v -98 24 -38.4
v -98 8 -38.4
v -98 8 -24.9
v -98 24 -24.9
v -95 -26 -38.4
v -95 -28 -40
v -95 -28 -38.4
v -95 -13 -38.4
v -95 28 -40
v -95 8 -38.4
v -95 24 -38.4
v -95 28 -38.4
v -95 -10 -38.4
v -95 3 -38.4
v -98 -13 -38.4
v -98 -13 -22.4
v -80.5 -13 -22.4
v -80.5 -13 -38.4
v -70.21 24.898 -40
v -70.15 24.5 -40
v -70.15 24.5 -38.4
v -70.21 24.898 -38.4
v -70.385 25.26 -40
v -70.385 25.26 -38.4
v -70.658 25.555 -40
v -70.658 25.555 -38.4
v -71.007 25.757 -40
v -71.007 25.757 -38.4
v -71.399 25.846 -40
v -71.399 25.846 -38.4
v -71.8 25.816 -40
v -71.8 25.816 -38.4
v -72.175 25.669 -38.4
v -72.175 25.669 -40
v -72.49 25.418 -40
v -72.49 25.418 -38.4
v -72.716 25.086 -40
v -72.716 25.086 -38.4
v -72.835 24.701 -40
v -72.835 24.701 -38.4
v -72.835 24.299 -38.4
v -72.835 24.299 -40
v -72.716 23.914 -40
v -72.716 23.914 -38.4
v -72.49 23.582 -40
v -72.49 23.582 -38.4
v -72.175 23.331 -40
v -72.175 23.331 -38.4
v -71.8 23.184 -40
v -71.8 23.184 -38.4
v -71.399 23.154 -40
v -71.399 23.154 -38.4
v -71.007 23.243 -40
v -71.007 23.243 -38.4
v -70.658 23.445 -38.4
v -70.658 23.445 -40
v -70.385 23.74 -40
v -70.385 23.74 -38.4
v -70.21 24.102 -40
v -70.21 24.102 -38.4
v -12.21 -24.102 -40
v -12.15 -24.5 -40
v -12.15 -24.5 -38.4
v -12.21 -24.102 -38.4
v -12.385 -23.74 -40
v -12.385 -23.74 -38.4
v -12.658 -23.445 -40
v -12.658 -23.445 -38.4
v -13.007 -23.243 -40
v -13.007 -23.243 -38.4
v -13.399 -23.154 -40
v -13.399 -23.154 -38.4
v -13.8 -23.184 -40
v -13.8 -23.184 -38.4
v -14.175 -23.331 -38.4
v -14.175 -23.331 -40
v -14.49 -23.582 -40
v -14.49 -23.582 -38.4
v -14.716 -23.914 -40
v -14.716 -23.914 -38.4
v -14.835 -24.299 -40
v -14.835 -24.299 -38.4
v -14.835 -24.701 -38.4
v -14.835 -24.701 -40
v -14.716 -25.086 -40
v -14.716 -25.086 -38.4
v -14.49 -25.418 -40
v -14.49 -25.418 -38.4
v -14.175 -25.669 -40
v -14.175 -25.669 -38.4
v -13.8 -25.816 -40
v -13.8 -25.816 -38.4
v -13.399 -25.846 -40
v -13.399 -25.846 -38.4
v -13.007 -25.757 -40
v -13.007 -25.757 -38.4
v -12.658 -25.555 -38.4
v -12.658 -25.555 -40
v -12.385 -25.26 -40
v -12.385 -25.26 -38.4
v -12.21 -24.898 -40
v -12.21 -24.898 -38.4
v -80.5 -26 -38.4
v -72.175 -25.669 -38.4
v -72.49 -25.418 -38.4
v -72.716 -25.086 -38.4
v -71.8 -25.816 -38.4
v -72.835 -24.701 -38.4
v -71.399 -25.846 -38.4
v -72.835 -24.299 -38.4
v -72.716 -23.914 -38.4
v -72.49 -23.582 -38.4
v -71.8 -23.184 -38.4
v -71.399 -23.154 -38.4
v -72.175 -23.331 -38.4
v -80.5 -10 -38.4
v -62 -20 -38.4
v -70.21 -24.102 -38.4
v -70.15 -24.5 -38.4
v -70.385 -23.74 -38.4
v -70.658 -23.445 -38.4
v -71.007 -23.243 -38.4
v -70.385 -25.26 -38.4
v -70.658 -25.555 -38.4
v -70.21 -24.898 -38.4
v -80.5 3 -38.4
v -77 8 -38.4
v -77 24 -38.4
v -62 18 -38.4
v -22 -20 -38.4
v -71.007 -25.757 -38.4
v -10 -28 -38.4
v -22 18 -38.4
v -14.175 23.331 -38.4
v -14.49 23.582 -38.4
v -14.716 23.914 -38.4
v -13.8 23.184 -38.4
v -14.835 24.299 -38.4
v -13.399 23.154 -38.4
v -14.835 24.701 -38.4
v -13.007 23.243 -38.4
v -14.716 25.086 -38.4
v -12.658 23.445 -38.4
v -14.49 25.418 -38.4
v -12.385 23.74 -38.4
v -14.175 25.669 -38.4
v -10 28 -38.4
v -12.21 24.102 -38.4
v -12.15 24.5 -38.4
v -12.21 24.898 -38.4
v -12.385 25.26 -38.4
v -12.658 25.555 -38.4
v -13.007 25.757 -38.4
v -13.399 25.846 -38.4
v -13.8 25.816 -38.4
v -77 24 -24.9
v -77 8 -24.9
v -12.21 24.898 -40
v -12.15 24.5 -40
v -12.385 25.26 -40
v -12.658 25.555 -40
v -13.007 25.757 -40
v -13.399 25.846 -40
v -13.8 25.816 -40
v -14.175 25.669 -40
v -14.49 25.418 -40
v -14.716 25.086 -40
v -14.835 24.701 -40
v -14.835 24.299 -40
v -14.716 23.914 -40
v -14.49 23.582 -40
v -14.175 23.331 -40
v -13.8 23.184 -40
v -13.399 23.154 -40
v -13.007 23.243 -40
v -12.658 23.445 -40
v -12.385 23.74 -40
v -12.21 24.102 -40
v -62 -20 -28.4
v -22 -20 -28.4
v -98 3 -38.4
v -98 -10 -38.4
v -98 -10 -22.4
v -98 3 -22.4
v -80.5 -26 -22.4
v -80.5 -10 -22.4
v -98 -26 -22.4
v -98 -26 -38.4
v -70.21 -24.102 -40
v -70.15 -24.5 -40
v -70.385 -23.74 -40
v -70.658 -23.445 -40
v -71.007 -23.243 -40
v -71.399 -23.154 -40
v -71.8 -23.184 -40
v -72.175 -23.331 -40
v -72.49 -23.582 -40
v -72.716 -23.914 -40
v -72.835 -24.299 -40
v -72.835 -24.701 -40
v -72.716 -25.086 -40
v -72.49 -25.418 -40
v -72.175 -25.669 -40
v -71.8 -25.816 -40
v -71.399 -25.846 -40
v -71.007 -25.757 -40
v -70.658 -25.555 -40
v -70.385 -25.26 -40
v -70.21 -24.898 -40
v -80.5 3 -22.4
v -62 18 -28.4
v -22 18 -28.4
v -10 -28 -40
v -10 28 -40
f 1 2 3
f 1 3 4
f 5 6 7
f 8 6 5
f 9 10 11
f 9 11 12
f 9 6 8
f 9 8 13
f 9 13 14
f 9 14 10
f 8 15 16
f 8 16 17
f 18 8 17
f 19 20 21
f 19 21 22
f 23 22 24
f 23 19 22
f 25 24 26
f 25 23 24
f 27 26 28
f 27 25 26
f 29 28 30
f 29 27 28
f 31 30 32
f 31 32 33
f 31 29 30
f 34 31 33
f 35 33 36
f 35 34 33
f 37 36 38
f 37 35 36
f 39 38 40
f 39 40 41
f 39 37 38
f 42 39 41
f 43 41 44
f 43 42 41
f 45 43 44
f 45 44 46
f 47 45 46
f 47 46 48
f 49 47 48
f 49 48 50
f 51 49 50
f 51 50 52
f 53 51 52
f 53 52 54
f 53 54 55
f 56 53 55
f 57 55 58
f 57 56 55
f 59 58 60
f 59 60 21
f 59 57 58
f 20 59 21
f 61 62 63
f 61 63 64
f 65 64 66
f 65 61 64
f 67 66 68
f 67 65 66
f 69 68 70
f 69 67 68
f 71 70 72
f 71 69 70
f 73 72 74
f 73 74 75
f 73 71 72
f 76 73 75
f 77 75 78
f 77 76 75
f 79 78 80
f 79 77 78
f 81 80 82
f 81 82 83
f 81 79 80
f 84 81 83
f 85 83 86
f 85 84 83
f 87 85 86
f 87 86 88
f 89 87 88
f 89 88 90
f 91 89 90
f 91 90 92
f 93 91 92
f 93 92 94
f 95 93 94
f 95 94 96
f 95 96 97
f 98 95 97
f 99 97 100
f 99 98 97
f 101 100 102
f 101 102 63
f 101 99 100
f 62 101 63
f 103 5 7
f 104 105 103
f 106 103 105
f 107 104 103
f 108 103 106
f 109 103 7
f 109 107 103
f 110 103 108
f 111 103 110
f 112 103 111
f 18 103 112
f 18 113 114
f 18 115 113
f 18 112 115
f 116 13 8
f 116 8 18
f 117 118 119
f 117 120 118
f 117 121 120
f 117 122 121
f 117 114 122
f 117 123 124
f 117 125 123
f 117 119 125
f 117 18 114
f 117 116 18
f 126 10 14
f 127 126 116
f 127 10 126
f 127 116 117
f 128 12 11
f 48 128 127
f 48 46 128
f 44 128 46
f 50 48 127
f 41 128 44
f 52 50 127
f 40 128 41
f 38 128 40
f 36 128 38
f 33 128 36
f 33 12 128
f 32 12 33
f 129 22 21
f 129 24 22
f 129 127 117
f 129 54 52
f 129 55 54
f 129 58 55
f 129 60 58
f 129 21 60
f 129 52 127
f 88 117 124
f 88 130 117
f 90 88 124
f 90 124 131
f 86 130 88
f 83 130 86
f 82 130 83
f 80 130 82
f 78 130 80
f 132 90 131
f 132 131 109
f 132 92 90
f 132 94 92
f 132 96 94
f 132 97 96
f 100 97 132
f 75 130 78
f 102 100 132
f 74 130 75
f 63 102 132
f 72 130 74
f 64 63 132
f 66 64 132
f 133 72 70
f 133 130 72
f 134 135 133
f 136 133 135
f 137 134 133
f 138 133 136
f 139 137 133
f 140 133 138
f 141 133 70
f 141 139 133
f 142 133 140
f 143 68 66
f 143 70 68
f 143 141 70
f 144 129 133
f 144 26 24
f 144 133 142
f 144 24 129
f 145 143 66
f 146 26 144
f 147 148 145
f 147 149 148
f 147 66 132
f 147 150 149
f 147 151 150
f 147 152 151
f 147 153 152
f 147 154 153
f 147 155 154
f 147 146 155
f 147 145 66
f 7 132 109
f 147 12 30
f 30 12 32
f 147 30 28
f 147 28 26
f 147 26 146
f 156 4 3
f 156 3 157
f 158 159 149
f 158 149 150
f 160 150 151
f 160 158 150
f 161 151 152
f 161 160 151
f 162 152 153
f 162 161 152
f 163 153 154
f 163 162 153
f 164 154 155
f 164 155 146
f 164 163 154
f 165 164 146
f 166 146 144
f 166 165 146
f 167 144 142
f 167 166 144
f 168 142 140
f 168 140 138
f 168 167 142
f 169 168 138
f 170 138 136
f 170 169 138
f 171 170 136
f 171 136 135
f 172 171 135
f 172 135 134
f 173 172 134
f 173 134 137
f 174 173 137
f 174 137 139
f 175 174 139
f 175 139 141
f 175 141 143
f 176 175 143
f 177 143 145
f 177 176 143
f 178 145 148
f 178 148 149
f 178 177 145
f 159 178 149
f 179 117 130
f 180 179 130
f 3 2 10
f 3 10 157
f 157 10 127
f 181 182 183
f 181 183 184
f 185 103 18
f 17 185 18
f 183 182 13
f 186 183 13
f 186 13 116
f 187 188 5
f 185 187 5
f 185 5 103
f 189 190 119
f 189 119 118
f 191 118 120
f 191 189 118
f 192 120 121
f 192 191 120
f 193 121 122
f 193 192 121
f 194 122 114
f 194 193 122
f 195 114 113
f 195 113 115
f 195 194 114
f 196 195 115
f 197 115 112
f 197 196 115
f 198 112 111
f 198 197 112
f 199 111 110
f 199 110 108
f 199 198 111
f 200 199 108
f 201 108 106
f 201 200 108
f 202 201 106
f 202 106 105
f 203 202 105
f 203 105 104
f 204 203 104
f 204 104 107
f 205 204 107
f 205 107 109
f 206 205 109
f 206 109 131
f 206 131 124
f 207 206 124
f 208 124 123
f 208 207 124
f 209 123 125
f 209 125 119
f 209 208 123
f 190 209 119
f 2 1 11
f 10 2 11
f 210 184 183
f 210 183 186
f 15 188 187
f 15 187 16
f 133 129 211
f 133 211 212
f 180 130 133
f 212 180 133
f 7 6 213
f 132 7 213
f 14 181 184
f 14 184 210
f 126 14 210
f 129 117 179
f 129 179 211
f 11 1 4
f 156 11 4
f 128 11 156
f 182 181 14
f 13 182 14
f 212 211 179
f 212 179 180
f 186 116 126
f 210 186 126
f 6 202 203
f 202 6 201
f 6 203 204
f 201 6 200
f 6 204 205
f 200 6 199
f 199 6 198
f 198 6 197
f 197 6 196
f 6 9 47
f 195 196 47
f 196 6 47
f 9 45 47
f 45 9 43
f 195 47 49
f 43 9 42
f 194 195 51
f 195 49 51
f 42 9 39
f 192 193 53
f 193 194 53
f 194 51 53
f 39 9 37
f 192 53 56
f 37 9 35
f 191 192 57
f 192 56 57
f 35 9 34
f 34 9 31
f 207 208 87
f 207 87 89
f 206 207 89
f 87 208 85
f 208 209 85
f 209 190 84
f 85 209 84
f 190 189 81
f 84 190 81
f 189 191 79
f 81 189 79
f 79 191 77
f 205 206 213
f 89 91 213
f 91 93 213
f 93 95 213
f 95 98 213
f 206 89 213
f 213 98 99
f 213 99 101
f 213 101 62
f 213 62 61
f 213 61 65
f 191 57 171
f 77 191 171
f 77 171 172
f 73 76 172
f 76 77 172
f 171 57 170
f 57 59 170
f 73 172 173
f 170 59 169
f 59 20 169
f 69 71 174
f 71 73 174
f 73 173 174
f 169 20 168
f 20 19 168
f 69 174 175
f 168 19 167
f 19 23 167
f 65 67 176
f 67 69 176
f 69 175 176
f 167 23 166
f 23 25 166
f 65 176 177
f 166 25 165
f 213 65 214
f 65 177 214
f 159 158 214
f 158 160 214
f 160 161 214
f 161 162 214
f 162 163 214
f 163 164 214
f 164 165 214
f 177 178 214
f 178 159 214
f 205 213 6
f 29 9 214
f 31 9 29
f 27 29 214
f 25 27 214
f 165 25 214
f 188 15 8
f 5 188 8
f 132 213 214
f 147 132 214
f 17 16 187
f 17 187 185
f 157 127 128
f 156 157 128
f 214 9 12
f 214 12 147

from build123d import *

# Parameters (mm, degrees)
PCB_START                  = -40
SK_PCB_W                   = 85
SK_PCB_H                   = 56
PCB_DEPTH                  = 1.6
BARRENOS_M2_5_START        = -40
SK_BARRENOS_M2_5_R         = 1.35
BARRENOS_M2_5_DEPTH        = 1.6
ETHERNET_START             = -38.4
SK_ETHERNET_W              = 21
SK_ETHERNET_H              = 16
ETHERNET_DEPTH             = 13.5
USB_START                  = -38.4
SK_USB_W                   = 17.5
SK_USB_H                   = 13
USB_DEPTH                  = 16
DISIPADOR_VENTILADOR_START = -38.4
SK_DISIPADOR_VENTILADOR_W  = 40
SK_DISIPADOR_VENTILADOR_H  = 38
DISIPADOR_VENTILADOR_DEPTH = 10


with BuildPart() as part:
    # Sk_PCB → PCB (new body)
    with BuildSketch(Plane.XY.offset(PCB_START)):
        with Locations((-52.5, 0)):
            Rectangle(SK_PCB_W, SK_PCB_H)
    extrude(amount=PCB_DEPTH)

    # Sk_Barrenos_M2-5 → Barrenos_M2-5 (cut)
    with BuildSketch(Plane.XY.offset(BARRENOS_M2_5_START)):
        with Locations((-13.5, -24.5)):
            Circle(SK_BARRENOS_M2_5_R)
        with Locations((-13.5, 24.5)):
            Circle(SK_BARRENOS_M2_5_R)
        with Locations((-71.5, -24.5)):
            Circle(SK_BARRENOS_M2_5_R)
        with Locations((-71.5, 24.5)):
            Circle(SK_BARRENOS_M2_5_R)
    extrude(amount=BARRENOS_M2_5_DEPTH, mode=Mode.SUBTRACT)

    # Sk_Ethernet → Ethernet (add)
    with BuildSketch(Plane.XY.offset(ETHERNET_START)):
        with Locations((-87.5, 16)):
            Rectangle(SK_ETHERNET_W, SK_ETHERNET_H)
    extrude(amount=ETHERNET_DEPTH)

    # Sk_USB → USB (add)
    with BuildSketch(Plane.XY.offset(USB_START)):
        with Locations((-89.25, -19.5)):
            Rectangle(SK_USB_W, SK_USB_H)
        with Locations((-89.25, -3.5)):
            Rectangle(SK_USB_W, SK_USB_H)
    extrude(amount=USB_DEPTH)

    # Sk_Disipador_ventilador → Disipador_ventilador (add)
    with BuildSketch(Plane.XY.offset(DISIPADOR_VENTILADOR_START)):
        with Locations((-42, -1)):
            Rectangle(SK_DISIPADOR_VENTILADOR_W, SK_DISIPADOR_VENTILADOR_H)
    extrude(amount=DISIPADOR_VENTILADOR_DEPTH)


solid = part.part
